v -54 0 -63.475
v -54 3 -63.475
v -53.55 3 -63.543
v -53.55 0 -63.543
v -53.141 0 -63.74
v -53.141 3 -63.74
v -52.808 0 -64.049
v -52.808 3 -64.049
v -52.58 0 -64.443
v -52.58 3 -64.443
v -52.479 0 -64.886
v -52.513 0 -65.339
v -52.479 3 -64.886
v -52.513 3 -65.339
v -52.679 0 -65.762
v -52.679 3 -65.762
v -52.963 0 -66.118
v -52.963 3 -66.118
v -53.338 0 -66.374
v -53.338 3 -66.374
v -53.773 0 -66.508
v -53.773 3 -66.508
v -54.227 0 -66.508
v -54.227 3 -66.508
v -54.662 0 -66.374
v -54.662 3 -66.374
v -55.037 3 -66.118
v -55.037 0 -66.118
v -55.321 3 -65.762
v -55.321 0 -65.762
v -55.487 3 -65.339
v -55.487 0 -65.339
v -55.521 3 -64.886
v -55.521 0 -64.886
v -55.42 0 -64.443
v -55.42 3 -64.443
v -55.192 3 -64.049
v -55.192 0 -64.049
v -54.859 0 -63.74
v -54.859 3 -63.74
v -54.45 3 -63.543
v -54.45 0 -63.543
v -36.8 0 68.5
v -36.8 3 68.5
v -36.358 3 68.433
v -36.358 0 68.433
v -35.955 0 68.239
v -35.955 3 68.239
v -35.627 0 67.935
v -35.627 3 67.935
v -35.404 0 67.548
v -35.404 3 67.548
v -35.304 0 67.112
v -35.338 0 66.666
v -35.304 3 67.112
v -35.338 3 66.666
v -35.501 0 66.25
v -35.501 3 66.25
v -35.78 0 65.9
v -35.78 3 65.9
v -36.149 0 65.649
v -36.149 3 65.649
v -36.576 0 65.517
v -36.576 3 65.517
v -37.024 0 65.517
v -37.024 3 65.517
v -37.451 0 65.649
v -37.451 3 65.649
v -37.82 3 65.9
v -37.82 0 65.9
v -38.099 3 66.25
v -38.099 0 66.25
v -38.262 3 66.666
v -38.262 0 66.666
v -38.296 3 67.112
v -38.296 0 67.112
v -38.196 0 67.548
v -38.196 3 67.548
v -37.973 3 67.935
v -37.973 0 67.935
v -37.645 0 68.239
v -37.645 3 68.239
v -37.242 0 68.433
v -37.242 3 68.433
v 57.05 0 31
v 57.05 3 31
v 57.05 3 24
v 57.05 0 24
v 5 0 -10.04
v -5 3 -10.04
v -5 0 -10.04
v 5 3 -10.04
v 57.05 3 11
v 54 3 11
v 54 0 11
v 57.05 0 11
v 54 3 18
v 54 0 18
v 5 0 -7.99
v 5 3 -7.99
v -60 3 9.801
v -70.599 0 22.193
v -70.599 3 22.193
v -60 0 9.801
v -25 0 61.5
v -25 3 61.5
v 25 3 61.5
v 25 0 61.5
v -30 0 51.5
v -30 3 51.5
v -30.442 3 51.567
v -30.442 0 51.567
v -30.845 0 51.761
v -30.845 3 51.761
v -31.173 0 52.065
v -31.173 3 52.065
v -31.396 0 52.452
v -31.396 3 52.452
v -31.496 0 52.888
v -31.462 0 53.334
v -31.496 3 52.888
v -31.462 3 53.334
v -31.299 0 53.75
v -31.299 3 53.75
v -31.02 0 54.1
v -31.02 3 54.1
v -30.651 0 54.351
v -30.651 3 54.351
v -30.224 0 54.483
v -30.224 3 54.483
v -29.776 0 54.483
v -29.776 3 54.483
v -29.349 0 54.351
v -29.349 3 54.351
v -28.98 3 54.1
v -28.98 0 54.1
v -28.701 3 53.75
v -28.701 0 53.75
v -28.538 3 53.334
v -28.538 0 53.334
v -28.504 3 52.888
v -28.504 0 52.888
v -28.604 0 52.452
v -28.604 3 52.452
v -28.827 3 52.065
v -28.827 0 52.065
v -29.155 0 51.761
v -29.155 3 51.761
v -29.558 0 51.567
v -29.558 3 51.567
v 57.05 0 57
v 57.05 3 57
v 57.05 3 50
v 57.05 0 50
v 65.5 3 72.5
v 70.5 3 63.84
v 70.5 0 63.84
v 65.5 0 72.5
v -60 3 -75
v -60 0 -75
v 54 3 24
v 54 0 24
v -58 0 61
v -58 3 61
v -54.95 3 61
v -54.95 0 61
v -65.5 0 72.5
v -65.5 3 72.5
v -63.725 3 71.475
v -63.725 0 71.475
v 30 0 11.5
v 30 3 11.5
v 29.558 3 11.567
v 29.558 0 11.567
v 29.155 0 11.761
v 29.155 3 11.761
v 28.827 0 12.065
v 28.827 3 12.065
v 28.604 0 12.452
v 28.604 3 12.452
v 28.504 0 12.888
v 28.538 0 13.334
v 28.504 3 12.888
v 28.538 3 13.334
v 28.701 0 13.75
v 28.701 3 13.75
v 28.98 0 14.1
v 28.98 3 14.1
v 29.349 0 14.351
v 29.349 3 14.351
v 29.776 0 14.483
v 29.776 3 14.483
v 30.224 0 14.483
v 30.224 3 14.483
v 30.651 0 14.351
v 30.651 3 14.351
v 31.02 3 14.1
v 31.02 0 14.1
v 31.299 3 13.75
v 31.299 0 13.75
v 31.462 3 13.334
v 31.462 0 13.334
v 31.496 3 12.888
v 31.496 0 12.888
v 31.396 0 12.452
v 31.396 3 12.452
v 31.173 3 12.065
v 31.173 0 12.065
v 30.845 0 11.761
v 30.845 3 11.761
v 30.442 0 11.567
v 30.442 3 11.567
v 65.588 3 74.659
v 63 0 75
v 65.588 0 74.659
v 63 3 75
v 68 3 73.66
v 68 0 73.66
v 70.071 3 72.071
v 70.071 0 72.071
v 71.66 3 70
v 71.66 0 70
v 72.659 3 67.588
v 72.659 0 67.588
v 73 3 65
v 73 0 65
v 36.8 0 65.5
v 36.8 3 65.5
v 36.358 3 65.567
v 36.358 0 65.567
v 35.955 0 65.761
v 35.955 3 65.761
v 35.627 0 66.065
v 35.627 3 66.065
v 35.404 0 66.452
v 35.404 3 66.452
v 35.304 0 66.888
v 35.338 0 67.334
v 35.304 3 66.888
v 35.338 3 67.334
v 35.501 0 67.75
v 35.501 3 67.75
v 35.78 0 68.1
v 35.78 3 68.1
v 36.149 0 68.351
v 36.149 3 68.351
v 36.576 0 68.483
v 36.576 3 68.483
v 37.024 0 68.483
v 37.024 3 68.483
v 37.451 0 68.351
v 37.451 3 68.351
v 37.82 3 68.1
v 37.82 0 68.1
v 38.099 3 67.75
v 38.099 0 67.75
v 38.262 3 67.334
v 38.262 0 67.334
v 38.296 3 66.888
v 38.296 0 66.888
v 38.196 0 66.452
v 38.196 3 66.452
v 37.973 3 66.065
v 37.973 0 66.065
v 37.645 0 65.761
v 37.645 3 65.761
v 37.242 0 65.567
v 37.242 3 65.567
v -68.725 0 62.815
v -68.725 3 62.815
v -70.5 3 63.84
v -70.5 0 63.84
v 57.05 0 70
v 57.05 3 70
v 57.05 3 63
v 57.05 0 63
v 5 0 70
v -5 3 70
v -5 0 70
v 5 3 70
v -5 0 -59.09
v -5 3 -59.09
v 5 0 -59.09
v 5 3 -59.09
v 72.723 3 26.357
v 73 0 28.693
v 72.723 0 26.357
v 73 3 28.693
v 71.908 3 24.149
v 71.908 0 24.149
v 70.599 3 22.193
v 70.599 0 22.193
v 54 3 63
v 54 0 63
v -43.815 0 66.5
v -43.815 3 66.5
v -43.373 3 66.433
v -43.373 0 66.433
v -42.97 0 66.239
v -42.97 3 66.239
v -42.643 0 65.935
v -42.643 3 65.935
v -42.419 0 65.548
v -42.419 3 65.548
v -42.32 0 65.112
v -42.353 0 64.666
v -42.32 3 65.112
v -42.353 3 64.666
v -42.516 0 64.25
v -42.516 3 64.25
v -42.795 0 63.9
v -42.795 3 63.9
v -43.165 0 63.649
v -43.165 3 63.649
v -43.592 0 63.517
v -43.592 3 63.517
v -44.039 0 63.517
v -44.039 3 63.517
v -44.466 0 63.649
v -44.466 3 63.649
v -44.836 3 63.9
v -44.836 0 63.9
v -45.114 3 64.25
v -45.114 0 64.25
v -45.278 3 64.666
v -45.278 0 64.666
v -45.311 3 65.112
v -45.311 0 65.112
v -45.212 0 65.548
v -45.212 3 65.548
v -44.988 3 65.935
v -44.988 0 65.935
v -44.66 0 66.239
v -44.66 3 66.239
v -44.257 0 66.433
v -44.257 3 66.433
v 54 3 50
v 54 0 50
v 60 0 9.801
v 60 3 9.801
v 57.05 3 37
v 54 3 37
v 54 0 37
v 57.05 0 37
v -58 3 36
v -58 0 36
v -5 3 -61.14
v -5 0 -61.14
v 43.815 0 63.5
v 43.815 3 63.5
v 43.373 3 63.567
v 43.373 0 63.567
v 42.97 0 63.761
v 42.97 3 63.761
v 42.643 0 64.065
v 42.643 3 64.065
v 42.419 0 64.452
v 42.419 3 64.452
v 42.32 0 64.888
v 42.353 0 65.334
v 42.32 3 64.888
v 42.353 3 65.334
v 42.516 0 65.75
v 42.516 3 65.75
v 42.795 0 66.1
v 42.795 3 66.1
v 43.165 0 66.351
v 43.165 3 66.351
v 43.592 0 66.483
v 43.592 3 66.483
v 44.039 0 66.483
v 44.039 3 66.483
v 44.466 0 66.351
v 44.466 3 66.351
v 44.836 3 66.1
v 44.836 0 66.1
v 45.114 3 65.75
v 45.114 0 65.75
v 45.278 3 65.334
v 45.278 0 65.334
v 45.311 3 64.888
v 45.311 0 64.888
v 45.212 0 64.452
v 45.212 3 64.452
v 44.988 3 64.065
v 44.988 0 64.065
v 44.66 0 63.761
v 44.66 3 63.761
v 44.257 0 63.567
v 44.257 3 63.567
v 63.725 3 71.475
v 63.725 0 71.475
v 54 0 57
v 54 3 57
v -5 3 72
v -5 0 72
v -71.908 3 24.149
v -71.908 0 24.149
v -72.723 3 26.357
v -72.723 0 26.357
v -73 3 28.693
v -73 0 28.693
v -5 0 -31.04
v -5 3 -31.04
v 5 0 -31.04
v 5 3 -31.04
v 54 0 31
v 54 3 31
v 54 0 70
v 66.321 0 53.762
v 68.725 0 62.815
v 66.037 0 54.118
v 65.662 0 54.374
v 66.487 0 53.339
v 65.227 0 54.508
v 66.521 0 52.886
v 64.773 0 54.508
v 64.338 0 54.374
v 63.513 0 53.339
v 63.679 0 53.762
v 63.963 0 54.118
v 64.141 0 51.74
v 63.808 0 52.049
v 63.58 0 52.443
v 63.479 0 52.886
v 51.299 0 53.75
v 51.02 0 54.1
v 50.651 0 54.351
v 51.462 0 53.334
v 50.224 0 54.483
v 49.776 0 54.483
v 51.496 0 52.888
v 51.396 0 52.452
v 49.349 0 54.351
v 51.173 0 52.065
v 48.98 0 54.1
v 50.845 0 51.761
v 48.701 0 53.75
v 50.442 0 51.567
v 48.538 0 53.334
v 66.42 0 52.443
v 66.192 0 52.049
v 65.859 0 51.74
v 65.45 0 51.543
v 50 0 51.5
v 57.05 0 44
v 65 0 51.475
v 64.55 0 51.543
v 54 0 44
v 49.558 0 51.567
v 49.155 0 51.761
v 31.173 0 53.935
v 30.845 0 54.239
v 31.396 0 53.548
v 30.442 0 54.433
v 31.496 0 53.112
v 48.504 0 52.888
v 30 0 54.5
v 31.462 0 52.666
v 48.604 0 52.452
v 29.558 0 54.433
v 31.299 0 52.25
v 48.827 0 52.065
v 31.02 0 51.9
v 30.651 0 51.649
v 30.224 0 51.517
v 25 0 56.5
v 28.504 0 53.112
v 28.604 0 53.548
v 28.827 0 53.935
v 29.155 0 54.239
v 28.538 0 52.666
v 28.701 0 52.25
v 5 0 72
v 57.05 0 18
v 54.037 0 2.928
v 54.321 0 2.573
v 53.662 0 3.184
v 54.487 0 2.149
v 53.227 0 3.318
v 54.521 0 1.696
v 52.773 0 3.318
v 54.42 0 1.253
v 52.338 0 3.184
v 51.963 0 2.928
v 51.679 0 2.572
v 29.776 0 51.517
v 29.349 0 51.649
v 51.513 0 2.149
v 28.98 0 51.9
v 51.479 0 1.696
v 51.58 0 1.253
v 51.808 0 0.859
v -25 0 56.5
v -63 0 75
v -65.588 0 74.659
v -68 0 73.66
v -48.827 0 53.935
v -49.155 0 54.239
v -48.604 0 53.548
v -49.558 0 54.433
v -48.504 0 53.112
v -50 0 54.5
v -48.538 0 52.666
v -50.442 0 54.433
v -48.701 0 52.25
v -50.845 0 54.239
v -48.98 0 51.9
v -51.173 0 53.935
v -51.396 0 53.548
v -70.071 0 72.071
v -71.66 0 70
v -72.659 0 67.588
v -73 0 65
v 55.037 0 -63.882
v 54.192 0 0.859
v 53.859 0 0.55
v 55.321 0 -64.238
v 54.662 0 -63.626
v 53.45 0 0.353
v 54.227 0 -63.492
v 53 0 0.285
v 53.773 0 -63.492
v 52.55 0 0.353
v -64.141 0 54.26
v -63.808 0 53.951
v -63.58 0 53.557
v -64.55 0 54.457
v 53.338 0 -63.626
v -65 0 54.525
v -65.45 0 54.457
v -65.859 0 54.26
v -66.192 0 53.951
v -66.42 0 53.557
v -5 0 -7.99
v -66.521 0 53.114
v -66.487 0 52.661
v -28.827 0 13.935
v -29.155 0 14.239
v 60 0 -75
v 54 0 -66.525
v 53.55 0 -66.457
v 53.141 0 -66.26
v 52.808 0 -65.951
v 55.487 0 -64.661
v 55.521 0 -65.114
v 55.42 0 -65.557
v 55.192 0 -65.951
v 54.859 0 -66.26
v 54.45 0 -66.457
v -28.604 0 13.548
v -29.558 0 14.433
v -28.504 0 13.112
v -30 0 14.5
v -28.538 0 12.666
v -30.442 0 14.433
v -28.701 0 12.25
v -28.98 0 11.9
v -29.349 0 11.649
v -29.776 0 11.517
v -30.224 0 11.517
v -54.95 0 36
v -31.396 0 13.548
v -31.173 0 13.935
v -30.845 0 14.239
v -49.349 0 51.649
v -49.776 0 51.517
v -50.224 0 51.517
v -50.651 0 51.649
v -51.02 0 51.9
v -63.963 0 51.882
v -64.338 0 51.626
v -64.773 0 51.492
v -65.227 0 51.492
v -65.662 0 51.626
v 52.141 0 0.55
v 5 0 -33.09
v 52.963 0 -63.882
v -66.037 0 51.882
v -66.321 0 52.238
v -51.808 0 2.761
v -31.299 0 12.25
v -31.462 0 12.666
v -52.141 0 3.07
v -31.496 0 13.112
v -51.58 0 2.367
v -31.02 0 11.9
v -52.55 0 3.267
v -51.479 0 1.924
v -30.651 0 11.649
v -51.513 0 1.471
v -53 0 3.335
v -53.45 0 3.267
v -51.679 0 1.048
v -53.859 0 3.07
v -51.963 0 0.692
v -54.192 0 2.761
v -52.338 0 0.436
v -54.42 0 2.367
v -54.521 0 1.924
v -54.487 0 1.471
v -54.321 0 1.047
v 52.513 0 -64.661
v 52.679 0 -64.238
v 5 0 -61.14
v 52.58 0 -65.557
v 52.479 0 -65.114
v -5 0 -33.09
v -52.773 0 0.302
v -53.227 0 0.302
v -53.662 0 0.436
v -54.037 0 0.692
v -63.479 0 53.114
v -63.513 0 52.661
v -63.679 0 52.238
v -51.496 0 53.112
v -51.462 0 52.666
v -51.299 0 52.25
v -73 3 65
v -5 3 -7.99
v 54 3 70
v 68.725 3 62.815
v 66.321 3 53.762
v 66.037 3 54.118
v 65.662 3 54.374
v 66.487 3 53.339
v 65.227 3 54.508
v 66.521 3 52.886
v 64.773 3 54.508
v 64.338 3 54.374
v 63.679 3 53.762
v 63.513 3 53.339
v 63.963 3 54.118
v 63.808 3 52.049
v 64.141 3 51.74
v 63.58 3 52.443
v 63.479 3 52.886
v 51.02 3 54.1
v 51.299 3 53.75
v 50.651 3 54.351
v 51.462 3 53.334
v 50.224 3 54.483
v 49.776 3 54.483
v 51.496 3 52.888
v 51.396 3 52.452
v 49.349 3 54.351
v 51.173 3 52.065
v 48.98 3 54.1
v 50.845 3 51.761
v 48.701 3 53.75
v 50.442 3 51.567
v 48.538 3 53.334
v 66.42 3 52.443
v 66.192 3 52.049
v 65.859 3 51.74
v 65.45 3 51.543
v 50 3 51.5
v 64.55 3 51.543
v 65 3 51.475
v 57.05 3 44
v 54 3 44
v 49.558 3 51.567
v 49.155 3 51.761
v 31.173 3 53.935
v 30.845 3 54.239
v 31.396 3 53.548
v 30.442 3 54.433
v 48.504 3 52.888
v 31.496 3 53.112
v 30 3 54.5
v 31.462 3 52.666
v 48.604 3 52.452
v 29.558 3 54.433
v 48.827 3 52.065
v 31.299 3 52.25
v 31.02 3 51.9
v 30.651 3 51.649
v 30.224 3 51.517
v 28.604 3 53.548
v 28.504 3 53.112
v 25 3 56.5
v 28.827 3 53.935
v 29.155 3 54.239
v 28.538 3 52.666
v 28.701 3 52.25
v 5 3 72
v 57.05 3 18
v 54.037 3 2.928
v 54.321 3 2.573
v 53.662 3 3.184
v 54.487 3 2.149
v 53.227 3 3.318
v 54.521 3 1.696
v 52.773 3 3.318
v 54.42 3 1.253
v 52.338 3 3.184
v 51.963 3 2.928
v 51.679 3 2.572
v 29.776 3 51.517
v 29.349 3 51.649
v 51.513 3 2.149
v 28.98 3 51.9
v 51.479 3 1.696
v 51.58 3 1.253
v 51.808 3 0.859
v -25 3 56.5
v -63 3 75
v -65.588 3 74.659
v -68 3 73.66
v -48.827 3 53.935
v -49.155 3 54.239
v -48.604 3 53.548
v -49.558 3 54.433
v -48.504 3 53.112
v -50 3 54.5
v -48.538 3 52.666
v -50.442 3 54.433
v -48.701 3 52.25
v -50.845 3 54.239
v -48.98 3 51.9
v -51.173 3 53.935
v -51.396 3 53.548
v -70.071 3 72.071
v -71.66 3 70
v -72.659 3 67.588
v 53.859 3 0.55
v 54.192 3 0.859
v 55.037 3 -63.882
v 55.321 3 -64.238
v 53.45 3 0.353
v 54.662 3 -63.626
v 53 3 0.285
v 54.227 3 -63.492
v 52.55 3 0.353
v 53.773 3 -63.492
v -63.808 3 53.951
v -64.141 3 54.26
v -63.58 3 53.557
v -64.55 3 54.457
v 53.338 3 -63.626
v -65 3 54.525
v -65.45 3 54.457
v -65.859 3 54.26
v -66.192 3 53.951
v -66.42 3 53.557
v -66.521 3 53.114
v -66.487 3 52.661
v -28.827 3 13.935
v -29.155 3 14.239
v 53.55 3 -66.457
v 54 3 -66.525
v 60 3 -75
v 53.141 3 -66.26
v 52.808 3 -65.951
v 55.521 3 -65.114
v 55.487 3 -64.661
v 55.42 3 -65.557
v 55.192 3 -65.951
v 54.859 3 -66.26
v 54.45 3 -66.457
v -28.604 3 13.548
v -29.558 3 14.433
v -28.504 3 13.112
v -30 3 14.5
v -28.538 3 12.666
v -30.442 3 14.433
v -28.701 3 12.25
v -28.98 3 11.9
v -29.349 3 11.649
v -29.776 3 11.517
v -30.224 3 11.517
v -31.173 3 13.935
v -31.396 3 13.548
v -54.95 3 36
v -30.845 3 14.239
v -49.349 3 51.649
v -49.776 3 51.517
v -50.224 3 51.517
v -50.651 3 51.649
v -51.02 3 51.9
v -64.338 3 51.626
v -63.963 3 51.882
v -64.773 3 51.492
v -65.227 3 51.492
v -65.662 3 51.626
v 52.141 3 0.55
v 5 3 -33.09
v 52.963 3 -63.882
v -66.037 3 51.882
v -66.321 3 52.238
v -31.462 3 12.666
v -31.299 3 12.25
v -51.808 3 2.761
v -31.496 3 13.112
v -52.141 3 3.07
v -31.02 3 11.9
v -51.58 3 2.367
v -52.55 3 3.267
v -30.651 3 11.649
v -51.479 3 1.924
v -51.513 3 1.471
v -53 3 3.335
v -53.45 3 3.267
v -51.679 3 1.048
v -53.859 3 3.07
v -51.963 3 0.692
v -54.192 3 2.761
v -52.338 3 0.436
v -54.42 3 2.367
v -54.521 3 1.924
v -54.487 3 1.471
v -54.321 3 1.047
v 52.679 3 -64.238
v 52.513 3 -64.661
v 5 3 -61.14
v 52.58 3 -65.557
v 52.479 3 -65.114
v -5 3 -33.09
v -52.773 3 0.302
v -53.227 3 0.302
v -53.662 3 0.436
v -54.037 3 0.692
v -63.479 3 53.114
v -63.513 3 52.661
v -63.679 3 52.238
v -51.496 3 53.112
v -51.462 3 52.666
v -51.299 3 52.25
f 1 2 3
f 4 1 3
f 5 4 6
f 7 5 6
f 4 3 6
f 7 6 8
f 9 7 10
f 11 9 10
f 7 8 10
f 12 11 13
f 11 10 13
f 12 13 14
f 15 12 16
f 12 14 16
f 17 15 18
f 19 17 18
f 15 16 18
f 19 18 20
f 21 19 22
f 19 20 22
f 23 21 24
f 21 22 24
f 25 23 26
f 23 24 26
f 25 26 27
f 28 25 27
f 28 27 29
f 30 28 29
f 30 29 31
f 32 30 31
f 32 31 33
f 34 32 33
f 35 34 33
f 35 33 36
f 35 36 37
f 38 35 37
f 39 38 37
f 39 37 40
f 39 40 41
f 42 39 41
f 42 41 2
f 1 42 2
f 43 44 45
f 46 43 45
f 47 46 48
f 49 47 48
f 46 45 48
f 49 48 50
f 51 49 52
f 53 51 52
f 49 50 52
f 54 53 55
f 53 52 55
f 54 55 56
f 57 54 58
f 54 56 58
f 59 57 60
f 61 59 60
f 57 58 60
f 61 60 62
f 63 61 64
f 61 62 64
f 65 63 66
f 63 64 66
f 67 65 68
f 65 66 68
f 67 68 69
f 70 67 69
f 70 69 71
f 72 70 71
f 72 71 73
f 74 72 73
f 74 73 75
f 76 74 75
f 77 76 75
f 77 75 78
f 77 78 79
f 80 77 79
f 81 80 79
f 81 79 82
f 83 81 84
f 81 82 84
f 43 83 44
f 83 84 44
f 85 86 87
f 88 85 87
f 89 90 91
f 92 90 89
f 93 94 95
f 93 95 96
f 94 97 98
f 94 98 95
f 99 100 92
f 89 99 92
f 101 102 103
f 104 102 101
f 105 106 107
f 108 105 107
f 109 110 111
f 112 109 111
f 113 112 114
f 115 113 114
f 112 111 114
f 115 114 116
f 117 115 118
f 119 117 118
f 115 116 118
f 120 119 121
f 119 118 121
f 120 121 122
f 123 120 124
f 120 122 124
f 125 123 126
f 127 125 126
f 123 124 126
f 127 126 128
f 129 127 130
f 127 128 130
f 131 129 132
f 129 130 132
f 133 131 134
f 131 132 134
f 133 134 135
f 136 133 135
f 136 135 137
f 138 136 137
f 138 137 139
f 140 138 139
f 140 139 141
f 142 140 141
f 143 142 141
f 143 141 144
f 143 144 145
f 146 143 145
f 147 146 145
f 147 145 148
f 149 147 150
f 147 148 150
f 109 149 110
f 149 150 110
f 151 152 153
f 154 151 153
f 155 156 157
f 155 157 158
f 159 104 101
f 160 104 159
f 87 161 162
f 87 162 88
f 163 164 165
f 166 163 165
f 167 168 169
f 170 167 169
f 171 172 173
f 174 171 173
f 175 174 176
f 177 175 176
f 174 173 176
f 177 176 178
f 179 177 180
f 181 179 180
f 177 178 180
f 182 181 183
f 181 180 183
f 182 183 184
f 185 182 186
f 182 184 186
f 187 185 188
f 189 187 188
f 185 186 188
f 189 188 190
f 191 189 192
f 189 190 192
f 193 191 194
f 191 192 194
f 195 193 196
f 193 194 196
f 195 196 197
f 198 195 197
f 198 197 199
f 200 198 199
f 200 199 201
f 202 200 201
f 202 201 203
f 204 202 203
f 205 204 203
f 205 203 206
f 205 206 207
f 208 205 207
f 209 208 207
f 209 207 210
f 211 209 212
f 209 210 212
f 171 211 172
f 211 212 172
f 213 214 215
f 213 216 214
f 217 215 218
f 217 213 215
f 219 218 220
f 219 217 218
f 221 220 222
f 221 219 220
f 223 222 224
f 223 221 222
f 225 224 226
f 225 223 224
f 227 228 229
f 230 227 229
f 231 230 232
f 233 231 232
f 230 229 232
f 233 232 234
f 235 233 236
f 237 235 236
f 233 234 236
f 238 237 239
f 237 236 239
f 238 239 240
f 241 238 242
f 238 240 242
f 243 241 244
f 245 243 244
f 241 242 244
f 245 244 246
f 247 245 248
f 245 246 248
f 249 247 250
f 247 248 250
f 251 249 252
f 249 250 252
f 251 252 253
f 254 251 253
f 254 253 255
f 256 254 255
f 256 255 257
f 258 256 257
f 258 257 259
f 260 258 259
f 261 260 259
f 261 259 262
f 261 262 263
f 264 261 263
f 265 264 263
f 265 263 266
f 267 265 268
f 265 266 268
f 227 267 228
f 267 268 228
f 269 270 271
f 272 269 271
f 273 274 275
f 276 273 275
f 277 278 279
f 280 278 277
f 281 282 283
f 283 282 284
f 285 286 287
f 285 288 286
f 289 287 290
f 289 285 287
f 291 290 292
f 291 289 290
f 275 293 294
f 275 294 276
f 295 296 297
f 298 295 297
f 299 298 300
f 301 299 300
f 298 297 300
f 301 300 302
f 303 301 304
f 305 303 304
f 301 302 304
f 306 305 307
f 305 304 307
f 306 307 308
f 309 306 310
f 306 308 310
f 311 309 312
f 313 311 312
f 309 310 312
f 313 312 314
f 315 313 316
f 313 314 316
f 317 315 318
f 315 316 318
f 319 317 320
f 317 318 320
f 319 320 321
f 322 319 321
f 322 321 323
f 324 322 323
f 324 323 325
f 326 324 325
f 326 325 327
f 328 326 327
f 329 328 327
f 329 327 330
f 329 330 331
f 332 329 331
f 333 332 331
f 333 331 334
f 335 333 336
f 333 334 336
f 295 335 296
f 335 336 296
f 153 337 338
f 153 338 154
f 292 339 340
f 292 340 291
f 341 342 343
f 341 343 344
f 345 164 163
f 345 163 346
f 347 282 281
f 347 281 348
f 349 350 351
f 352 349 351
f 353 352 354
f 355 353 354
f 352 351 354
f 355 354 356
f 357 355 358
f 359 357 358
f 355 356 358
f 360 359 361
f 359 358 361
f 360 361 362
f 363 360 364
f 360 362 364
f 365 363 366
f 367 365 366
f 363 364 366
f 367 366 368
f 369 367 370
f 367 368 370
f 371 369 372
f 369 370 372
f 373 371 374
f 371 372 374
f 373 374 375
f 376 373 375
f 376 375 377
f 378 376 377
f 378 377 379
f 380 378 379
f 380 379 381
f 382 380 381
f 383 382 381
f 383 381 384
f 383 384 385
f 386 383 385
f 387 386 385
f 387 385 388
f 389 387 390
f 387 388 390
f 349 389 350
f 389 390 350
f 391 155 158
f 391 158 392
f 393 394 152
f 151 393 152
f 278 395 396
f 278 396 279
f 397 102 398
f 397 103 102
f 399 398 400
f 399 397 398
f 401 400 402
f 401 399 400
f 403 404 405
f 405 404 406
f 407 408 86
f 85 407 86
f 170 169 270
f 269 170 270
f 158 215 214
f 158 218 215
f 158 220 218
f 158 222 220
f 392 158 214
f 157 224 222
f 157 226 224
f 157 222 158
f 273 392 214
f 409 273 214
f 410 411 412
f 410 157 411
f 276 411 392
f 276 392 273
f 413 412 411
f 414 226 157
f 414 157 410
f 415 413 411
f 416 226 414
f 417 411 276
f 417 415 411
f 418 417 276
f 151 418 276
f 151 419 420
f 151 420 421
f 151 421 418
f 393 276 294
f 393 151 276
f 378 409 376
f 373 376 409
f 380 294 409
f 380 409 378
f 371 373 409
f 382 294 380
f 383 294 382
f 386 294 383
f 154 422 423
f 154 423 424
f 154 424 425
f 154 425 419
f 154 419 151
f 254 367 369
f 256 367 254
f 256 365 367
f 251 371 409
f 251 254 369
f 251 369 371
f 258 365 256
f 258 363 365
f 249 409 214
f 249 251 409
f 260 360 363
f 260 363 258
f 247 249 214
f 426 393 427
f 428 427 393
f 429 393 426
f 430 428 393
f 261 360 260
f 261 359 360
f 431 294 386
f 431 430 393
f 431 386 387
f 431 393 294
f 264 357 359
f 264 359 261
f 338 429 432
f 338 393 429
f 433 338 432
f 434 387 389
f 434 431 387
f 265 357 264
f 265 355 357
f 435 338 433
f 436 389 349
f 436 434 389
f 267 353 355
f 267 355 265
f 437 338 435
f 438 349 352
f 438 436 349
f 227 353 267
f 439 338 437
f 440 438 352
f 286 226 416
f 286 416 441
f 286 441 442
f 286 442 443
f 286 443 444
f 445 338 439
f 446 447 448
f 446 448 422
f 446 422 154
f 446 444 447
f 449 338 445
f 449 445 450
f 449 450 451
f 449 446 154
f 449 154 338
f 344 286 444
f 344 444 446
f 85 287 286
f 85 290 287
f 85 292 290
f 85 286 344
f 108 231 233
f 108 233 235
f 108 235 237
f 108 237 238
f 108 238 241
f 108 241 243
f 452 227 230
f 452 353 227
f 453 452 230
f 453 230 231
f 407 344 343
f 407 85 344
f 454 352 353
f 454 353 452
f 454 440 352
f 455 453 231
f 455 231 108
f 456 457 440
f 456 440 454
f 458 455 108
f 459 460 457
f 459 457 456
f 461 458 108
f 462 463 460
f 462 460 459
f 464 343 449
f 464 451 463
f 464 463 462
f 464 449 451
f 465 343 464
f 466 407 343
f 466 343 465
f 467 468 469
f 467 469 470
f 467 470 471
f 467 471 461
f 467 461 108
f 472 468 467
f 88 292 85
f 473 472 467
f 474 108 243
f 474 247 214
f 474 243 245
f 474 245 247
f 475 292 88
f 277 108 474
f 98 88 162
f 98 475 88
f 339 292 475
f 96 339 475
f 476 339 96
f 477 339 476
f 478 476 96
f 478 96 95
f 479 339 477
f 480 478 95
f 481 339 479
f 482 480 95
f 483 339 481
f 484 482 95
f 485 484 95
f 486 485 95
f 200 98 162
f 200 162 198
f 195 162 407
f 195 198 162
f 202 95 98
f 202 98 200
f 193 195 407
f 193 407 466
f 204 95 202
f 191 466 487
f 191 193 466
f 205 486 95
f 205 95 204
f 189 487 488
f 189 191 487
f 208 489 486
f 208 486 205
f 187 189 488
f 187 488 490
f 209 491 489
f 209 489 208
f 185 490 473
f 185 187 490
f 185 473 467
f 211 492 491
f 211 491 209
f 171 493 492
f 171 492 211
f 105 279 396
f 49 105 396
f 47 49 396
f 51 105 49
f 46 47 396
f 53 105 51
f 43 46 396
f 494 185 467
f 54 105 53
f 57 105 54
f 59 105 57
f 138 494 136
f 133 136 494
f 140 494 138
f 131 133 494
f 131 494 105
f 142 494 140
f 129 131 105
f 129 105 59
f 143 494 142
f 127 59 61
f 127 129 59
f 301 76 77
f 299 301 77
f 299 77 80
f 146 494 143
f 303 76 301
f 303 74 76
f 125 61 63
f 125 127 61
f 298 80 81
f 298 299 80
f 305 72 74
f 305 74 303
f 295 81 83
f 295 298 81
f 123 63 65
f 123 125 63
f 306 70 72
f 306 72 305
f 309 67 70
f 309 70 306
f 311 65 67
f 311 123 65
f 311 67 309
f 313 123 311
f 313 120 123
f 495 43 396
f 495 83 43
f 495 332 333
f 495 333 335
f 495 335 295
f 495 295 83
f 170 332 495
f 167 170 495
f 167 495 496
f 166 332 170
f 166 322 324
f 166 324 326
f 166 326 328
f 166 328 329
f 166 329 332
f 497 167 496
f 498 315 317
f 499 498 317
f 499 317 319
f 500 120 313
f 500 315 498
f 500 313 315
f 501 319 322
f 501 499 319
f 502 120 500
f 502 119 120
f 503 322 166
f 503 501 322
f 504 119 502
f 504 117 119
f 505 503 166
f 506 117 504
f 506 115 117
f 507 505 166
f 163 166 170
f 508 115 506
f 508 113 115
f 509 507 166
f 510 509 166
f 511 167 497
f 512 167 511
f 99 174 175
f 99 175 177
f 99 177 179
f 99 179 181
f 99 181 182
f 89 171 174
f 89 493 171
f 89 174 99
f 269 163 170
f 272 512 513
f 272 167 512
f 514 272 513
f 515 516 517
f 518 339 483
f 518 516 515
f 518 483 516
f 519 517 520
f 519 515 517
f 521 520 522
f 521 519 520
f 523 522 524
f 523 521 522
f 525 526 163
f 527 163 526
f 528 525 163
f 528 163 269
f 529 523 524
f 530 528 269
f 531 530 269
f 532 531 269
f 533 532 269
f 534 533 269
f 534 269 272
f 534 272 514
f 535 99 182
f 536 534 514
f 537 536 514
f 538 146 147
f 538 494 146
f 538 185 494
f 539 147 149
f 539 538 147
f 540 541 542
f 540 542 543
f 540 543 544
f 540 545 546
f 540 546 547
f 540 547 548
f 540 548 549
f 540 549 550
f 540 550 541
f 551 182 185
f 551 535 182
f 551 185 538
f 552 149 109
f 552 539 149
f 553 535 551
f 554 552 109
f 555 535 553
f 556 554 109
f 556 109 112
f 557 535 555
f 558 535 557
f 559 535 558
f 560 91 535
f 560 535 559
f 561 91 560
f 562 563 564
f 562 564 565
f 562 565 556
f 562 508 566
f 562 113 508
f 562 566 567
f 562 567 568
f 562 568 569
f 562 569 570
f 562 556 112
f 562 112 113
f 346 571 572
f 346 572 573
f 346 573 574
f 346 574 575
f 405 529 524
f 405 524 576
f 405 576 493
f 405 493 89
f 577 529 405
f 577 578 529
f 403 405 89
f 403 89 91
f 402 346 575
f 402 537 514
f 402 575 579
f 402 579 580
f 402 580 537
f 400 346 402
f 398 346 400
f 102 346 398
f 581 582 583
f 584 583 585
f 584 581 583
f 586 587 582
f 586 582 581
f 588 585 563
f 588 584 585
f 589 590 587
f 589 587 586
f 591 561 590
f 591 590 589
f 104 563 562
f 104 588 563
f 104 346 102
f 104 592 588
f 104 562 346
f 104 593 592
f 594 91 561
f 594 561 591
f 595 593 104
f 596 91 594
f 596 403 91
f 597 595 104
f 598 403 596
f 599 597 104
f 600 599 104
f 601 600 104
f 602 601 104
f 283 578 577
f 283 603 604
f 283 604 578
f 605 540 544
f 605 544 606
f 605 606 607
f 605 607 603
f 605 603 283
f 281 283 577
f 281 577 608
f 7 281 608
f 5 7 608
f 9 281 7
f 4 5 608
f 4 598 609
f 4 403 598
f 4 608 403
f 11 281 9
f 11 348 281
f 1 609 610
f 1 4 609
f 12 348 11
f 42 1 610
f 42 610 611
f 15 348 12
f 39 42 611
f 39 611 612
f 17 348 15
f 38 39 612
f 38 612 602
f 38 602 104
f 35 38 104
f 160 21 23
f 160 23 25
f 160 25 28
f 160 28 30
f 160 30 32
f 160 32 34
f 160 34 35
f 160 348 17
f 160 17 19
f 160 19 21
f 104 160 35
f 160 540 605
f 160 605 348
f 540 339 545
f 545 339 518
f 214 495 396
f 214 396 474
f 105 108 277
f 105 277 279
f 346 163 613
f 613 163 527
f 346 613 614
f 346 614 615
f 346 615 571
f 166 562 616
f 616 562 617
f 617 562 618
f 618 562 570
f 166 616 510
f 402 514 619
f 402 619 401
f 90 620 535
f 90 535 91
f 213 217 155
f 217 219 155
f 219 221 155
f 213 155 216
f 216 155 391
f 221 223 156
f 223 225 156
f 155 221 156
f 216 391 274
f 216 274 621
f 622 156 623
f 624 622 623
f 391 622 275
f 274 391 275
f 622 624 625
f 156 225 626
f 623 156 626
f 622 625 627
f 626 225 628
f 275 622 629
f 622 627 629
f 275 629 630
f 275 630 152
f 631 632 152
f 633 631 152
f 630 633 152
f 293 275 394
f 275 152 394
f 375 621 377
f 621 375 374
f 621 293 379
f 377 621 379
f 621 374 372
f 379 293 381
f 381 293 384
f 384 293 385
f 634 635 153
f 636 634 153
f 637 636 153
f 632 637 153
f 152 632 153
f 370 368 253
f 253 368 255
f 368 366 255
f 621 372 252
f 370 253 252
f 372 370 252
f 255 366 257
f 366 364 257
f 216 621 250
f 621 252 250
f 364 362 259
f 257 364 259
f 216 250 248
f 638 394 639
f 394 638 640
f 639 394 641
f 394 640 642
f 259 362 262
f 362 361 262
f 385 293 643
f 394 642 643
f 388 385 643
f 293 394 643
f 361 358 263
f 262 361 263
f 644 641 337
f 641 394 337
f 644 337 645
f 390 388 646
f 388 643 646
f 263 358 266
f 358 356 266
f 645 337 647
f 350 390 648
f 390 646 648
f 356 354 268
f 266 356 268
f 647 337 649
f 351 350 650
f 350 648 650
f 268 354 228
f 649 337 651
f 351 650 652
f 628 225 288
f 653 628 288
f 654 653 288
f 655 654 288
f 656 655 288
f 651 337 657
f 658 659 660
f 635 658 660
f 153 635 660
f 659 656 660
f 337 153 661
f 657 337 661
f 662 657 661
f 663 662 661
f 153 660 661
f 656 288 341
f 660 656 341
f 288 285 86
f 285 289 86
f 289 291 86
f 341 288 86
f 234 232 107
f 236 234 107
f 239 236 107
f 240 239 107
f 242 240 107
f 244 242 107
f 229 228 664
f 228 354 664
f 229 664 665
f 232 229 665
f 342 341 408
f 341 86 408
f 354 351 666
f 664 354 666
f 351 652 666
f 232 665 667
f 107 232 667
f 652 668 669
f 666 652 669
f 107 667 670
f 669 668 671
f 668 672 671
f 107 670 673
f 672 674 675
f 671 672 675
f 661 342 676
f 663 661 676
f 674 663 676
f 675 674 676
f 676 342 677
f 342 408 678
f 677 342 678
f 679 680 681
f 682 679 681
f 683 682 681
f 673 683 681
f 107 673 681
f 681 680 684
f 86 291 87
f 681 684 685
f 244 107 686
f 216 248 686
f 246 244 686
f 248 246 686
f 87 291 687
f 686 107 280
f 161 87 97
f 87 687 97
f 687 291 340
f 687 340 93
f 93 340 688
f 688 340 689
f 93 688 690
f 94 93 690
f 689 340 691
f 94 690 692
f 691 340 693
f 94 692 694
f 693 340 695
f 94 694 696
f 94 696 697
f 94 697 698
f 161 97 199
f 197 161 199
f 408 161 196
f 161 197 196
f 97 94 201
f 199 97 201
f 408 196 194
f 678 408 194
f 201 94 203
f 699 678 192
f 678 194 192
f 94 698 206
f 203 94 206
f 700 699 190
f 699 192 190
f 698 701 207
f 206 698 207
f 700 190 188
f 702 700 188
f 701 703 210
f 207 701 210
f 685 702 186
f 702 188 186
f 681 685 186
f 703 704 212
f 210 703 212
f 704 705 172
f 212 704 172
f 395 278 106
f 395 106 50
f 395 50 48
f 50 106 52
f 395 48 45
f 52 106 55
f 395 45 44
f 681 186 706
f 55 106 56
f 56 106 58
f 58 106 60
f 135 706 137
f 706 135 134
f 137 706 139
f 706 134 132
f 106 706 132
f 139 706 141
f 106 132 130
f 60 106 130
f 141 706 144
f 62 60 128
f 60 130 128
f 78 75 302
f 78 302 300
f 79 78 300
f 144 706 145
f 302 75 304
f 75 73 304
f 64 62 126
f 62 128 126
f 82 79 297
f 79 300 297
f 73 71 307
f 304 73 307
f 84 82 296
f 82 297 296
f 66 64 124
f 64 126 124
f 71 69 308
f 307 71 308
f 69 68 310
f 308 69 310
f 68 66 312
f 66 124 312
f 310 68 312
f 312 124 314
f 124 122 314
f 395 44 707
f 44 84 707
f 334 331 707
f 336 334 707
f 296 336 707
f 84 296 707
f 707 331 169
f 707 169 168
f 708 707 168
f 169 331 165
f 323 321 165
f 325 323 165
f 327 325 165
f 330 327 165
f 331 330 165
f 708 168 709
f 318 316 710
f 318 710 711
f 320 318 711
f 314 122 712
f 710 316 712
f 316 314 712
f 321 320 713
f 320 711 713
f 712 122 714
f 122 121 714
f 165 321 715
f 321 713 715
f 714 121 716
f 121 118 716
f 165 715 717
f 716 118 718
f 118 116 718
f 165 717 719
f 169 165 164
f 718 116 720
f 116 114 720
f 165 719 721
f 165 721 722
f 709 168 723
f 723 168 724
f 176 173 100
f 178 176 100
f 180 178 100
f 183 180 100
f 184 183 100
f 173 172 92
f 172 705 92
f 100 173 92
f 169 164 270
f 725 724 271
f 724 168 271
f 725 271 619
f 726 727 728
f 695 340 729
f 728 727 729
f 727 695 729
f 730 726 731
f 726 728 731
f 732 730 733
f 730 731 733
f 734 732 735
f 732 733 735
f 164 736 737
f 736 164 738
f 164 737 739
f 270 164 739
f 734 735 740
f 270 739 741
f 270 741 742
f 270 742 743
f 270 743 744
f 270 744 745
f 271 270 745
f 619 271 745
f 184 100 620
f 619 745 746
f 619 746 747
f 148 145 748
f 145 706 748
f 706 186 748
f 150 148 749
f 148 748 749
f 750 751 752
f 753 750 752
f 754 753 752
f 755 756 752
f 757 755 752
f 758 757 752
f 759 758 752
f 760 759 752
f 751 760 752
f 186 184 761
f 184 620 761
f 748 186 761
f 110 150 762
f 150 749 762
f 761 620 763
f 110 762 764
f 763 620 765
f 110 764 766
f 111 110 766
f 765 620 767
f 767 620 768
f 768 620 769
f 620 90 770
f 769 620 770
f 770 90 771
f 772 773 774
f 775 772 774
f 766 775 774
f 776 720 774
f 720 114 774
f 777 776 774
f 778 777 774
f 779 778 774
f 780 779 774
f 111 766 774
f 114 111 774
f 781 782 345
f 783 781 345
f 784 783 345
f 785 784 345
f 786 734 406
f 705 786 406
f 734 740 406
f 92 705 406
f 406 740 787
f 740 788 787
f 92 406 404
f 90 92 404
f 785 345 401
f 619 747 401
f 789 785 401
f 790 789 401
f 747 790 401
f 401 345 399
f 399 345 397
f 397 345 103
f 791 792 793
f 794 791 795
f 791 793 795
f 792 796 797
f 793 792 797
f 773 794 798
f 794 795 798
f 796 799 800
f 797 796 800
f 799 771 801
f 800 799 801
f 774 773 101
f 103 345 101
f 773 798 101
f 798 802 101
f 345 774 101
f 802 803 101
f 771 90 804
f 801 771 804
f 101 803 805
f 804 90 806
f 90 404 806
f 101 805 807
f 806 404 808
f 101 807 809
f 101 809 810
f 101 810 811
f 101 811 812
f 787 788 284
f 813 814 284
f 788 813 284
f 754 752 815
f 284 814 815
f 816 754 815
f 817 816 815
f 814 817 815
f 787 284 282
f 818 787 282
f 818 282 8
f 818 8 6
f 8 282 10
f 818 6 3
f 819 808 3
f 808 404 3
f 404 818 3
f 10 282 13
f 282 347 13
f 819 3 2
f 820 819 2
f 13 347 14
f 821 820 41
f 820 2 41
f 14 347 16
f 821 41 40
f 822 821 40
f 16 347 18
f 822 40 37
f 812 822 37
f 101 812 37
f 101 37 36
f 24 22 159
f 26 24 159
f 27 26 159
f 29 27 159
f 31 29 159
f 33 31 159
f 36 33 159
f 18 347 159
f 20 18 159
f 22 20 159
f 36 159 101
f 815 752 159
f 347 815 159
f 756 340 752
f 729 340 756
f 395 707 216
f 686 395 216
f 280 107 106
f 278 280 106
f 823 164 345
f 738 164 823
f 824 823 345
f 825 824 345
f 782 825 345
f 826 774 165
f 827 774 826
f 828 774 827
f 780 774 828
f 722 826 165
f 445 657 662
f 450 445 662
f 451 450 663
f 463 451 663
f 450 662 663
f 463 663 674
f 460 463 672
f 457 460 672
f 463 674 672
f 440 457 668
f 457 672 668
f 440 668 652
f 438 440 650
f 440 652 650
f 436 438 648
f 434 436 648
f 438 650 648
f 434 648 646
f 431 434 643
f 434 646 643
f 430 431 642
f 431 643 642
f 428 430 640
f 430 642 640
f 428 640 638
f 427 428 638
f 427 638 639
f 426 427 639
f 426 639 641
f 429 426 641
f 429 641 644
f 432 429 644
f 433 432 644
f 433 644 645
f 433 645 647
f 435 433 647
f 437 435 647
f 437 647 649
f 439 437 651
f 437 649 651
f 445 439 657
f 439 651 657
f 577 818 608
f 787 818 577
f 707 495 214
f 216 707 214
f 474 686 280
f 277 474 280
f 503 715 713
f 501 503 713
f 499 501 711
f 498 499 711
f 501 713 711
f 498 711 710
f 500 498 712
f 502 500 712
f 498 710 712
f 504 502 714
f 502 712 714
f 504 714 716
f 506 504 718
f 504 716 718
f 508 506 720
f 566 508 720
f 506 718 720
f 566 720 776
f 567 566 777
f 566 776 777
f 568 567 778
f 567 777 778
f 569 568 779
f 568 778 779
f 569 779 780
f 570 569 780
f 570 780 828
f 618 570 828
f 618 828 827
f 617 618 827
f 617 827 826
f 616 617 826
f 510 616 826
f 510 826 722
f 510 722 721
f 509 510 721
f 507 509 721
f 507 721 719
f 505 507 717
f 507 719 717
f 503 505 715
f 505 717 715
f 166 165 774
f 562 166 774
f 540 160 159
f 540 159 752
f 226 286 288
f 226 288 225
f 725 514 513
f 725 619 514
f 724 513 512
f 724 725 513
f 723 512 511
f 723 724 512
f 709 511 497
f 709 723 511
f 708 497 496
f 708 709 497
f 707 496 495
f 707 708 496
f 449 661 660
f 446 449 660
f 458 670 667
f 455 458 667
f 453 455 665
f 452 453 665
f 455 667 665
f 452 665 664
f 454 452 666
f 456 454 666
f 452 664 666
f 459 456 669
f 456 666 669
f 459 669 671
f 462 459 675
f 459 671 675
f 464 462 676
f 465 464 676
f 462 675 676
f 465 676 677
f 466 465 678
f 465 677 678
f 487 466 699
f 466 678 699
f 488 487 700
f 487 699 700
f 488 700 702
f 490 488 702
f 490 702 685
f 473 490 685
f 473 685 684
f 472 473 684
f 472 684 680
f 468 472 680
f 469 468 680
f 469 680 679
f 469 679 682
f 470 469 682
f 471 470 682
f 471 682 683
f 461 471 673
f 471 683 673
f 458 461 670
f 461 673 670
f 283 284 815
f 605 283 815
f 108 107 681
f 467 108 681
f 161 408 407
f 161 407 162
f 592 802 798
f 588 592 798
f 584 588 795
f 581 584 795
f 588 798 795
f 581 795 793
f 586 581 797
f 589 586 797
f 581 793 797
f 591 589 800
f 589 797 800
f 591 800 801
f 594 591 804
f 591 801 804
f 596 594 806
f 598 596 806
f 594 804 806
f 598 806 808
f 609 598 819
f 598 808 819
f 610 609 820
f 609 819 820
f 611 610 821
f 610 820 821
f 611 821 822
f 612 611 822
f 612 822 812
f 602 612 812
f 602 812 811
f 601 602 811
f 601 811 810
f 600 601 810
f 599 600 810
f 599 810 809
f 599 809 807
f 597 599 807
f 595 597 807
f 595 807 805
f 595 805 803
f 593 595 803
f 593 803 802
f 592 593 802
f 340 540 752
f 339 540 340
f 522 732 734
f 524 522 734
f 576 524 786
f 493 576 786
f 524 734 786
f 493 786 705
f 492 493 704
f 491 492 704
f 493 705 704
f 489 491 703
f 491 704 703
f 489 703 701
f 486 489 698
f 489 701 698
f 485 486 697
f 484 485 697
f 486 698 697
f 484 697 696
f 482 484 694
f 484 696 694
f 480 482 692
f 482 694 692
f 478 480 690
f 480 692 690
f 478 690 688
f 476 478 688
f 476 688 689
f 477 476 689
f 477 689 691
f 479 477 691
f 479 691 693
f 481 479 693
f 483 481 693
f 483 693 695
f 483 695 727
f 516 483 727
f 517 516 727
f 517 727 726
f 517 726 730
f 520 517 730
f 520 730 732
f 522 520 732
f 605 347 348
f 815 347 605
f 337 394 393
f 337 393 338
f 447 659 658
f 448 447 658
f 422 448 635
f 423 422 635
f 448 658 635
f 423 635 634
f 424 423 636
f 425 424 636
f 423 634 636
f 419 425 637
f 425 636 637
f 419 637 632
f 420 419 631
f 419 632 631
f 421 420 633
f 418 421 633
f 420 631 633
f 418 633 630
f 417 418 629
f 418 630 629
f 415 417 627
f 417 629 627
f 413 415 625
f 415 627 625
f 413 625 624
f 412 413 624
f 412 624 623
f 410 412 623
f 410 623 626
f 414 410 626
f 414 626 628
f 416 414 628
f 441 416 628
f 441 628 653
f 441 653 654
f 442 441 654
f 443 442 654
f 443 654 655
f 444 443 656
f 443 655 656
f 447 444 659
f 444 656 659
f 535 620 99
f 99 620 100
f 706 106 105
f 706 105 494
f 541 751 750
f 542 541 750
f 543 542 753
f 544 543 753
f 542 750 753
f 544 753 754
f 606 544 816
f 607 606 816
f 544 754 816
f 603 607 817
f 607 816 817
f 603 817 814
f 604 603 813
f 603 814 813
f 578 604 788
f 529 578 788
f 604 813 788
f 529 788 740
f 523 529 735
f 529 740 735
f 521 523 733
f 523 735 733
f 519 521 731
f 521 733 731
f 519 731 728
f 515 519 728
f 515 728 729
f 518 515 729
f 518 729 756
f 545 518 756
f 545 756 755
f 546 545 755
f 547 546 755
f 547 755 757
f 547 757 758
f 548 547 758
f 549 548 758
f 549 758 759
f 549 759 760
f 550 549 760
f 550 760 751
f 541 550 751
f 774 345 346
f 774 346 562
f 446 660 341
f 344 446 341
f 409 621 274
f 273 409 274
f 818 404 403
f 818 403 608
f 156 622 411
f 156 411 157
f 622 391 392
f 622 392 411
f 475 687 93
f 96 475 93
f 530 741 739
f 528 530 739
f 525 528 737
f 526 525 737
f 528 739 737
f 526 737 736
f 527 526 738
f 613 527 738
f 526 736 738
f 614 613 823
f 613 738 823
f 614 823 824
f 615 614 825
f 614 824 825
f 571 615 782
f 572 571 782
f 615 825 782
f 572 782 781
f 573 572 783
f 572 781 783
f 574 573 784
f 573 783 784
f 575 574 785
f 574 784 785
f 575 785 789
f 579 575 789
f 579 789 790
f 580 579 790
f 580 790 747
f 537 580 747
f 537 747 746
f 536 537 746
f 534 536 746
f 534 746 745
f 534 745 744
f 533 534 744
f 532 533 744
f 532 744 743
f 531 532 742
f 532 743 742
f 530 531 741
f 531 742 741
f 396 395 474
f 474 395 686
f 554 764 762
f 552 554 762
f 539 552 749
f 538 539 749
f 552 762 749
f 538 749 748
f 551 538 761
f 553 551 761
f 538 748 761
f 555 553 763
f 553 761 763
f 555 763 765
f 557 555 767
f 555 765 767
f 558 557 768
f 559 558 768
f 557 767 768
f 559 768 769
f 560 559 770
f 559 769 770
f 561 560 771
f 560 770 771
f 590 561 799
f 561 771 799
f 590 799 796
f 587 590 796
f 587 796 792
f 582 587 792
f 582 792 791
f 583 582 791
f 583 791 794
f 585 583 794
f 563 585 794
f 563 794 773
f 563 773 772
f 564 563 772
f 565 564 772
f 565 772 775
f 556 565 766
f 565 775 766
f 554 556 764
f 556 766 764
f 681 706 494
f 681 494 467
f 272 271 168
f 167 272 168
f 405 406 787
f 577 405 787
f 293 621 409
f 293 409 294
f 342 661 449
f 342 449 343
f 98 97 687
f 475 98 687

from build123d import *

# Parameters (mm, degrees)
BOSS_EXTRUDE1_DEPTH = 3
SKETCH2_R           = 1.525
CUT_EXTRUDE1_DEPTH  = 105.70434566
SKETCH3_W           = 10
SKETCH3_H           = 2.05
CUT_EXTRUDE2_DEPTH  = 105.70434566
SKETCH4_R           = 1.5
CUT_EXTRUDE3_DEPTH  = 3
SKETCH5_R           = 1.5
SKETCH5_R_2         = 1.525
SKETCH5_W           = 50
SKETCH5_H           = 5
CUT_EXTRUDE4_DEPTH  = 3
SKETCH6_W           = 3.05
SKETCH6_H           = 7
CUT_EXTRUDE5_DEPTH  = 10
SKETCH7_W           = 10
SKETCH7_H           = 2
SKETCH7_W_2         = 3.05
SKETCH7_H_2         = 25
CUT_EXTRUDE6_DEPTH  = 10
FILLET3_R           = 10
CUT_EXTRUDE7_DEPTH  = 10
SKETCH9_R           = 1.5
CUT_EXTRUDE8_DEPTH  = 3


with BuildPart() as part:
    # Sketch1 → Boss-Extrude1 (new body)
    with BuildSketch(Plane(origin=(0, 0, 0), x_dir=(1, 0, 0), z_dir=(0, 1, 0))):
        Polygon((-73, -25), (-60, -9.801315846), (-60, 75), (60, 75), (60, -9.801315846), (73, -25), (73, -75), (60, -75), (-60, -75), (-73, -75), align=None)
    extrude(amount=BOSS_EXTRUDE1_DEPTH)

    # Sketch2 → Cut-Extrude1 (cut, through all)
    with BuildSketch(Plane(origin=(0, 3, 0), x_dir=(1, 0, 0), z_dir=(0, 1, 0))):
        with Locations(Location((-53, -1.81, 0), (0, 0, 270))):
            Circle(SKETCH2_R)
        with Locations(Location((-54, 65, 0), (0, 0, 270))):
            Circle(SKETCH2_R)
        with Locations(Location((53, -1.81, 0), (0, 0, 90))):
            Circle(SKETCH2_R)
        with Locations(Location((54, 65, 0), (0, 0, 90))):
            Circle(SKETCH2_R)
    extrude(amount=-CUT_EXTRUDE1_DEPTH, mode=Mode.SUBTRACT)

    # Sketch3 → Cut-Extrude2 (cut, through all)
    with BuildSketch(Plane(origin=(0, 3, 0), x_dir=(1, 0, 0), z_dir=(0, 1, 0))):
        with Locations((0, 32.065)):
            Rectangle(SKETCH3_W, SKETCH3_H)
        with Locations((0, 9.015)):
            Rectangle(SKETCH3_W, SKETCH3_H)
        with Locations((0, 60.115)):
            Rectangle(SKETCH3_W, SKETCH3_H)
    extrude(amount=-CUT_EXTRUDE2_DEPTH, mode=Mode.SUBTRACT)

    # Sketch4 → Cut-Extrude3 (cut)
    with BuildSketch(Plane(origin=(0, 3, 0), x_dir=(1, 0, 0), z_dir=(0, 1, 0))):
        with Locations(Location((-50, -53, 0), (0, 0, 270))):
            Circle(SKETCH4_R)
        with Locations(Location((-43.815341562, -65, 0), (0, 0, 270))):
            Circle(SKETCH4_R)
        with Locations(Location((43.815341562, -65, 0), (0, 0, 90))):
            Circle(SKETCH4_R)
        with Locations(Location((50, -53, 0), (0, 0, 90))):
            Circle(SKETCH4_R)
    extrude(amount=-CUT_EXTRUDE3_DEPTH, mode=Mode.SUBTRACT)

    # Sketch5 → Cut-Extrude4 (cut)
    with BuildSketch(Plane(origin=(0, 3, 0), x_dir=(1, 0, 0), z_dir=(0, 1, 0))):
        with Locations(Location((-36.8, -67, 0), (0, 0, 270))):
            Circle(SKETCH5_R)
        with Locations(Location((36.8, -67, 0), (0, 0, 90))):
            Circle(SKETCH5_R)
        with Locations(Location((-65, -53, 0), (0, 0, 270))):
            Circle(SKETCH5_R_2)
        with Locations(Location((65, -53, 0), (0, 0, 90))):
            Circle(SKETCH5_R_2)
        with Locations((0, -59)):
            Rectangle(SKETCH5_W, SKETCH5_H)
    extrude(amount=-CUT_EXTRUDE4_DEPTH, mode=Mode.SUBTRACT)

    # Sketch6 → Cut-Extrude5 (cut)
    with BuildSketch(Plane(origin=(0, 3, 0), x_dir=(1, 0, 0), z_dir=(0, 1, 0))):
        with Locations((55.525, -53.5)):
            Rectangle(SKETCH6_W, SKETCH6_H)
        with Locations((55.525, -66.5)):
            Rectangle(SKETCH6_W, SKETCH6_H)
        with Locations((55.525, -40.5)):
            Rectangle(SKETCH6_W, SKETCH6_H)
        with Locations((55.525, -27.5)):
            Rectangle(SKETCH6_W, SKETCH6_H)
        with Locations((55.525, -14.5)):
            Rectangle(SKETCH6_W, SKETCH6_H)
    extrude(amount=-CUT_EXTRUDE5_DEPTH, mode=Mode.SUBTRACT)

    # Sketch7 → Cut-Extrude6 (cut)
    with BuildSketch(Plane(origin=(0, 3, 0), x_dir=(1, 0, 0), z_dir=(0, 1, 0))):
        with Locations((0, -71)):
            Rectangle(SKETCH7_W, SKETCH7_H)
        with Locations((-56.475, -48.5)):
            Rectangle(SKETCH7_W_2, SKETCH7_H_2)
    extrude(amount=-CUT_EXTRUDE6_DEPTH, mode=Mode.SUBTRACT)

    # Fillet3
    fillet3_edges = [part.edges().sort_by_distance(p)[0] for p in [
        (73, 1.5, 25),
        (73, 1.5, 75),
        (-73, 1.5, 75),
        (-73, 1.5, 25),
    ]]
    fillet(fillet3_edges, radius=FILLET3_R)

    # Sketch8 → Cut-Extrude7 (cut)
    with BuildSketch(Plane(origin=(0, 3, 0), x_dir=(1, 0, 0), z_dir=(0, 1, 0))):
        Polygon((70.5, -63.839745962), (65.5, -72.5), (63.724647922, -71.475), (68.724647922, -62.814745962), align=None)
        Polygon((-68.724647922, -62.814745962), (-70.5, -63.839745962), (-65.5, -72.5), (-63.724647922, -71.475), align=None)
    extrude(amount=-CUT_EXTRUDE7_DEPTH, mode=Mode.SUBTRACT)

    # Sketch9 → Cut-Extrude8 (cut)
    with BuildSketch(Plane(origin=(0, 3, 0), x_dir=(1, 0, 0), z_dir=(0, 1, 0))):
        with Locations(Location((-30, -13, 0), (0, 0, 270))):
            Circle(SKETCH9_R)
        with Locations(Location((30, -13, 0), (0, 0, 90))):
            Circle(SKETCH9_R)
        with Locations(Location((30, -53, 0), (0, 0, 270))):
            Circle(SKETCH9_R)
        with Locations(Location((-30, -53, 0), (0, 0, 90))):
            Circle(SKETCH9_R)
    extrude(amount=-CUT_EXTRUDE8_DEPTH, mode=Mode.SUBTRACT)


solid = part.part
